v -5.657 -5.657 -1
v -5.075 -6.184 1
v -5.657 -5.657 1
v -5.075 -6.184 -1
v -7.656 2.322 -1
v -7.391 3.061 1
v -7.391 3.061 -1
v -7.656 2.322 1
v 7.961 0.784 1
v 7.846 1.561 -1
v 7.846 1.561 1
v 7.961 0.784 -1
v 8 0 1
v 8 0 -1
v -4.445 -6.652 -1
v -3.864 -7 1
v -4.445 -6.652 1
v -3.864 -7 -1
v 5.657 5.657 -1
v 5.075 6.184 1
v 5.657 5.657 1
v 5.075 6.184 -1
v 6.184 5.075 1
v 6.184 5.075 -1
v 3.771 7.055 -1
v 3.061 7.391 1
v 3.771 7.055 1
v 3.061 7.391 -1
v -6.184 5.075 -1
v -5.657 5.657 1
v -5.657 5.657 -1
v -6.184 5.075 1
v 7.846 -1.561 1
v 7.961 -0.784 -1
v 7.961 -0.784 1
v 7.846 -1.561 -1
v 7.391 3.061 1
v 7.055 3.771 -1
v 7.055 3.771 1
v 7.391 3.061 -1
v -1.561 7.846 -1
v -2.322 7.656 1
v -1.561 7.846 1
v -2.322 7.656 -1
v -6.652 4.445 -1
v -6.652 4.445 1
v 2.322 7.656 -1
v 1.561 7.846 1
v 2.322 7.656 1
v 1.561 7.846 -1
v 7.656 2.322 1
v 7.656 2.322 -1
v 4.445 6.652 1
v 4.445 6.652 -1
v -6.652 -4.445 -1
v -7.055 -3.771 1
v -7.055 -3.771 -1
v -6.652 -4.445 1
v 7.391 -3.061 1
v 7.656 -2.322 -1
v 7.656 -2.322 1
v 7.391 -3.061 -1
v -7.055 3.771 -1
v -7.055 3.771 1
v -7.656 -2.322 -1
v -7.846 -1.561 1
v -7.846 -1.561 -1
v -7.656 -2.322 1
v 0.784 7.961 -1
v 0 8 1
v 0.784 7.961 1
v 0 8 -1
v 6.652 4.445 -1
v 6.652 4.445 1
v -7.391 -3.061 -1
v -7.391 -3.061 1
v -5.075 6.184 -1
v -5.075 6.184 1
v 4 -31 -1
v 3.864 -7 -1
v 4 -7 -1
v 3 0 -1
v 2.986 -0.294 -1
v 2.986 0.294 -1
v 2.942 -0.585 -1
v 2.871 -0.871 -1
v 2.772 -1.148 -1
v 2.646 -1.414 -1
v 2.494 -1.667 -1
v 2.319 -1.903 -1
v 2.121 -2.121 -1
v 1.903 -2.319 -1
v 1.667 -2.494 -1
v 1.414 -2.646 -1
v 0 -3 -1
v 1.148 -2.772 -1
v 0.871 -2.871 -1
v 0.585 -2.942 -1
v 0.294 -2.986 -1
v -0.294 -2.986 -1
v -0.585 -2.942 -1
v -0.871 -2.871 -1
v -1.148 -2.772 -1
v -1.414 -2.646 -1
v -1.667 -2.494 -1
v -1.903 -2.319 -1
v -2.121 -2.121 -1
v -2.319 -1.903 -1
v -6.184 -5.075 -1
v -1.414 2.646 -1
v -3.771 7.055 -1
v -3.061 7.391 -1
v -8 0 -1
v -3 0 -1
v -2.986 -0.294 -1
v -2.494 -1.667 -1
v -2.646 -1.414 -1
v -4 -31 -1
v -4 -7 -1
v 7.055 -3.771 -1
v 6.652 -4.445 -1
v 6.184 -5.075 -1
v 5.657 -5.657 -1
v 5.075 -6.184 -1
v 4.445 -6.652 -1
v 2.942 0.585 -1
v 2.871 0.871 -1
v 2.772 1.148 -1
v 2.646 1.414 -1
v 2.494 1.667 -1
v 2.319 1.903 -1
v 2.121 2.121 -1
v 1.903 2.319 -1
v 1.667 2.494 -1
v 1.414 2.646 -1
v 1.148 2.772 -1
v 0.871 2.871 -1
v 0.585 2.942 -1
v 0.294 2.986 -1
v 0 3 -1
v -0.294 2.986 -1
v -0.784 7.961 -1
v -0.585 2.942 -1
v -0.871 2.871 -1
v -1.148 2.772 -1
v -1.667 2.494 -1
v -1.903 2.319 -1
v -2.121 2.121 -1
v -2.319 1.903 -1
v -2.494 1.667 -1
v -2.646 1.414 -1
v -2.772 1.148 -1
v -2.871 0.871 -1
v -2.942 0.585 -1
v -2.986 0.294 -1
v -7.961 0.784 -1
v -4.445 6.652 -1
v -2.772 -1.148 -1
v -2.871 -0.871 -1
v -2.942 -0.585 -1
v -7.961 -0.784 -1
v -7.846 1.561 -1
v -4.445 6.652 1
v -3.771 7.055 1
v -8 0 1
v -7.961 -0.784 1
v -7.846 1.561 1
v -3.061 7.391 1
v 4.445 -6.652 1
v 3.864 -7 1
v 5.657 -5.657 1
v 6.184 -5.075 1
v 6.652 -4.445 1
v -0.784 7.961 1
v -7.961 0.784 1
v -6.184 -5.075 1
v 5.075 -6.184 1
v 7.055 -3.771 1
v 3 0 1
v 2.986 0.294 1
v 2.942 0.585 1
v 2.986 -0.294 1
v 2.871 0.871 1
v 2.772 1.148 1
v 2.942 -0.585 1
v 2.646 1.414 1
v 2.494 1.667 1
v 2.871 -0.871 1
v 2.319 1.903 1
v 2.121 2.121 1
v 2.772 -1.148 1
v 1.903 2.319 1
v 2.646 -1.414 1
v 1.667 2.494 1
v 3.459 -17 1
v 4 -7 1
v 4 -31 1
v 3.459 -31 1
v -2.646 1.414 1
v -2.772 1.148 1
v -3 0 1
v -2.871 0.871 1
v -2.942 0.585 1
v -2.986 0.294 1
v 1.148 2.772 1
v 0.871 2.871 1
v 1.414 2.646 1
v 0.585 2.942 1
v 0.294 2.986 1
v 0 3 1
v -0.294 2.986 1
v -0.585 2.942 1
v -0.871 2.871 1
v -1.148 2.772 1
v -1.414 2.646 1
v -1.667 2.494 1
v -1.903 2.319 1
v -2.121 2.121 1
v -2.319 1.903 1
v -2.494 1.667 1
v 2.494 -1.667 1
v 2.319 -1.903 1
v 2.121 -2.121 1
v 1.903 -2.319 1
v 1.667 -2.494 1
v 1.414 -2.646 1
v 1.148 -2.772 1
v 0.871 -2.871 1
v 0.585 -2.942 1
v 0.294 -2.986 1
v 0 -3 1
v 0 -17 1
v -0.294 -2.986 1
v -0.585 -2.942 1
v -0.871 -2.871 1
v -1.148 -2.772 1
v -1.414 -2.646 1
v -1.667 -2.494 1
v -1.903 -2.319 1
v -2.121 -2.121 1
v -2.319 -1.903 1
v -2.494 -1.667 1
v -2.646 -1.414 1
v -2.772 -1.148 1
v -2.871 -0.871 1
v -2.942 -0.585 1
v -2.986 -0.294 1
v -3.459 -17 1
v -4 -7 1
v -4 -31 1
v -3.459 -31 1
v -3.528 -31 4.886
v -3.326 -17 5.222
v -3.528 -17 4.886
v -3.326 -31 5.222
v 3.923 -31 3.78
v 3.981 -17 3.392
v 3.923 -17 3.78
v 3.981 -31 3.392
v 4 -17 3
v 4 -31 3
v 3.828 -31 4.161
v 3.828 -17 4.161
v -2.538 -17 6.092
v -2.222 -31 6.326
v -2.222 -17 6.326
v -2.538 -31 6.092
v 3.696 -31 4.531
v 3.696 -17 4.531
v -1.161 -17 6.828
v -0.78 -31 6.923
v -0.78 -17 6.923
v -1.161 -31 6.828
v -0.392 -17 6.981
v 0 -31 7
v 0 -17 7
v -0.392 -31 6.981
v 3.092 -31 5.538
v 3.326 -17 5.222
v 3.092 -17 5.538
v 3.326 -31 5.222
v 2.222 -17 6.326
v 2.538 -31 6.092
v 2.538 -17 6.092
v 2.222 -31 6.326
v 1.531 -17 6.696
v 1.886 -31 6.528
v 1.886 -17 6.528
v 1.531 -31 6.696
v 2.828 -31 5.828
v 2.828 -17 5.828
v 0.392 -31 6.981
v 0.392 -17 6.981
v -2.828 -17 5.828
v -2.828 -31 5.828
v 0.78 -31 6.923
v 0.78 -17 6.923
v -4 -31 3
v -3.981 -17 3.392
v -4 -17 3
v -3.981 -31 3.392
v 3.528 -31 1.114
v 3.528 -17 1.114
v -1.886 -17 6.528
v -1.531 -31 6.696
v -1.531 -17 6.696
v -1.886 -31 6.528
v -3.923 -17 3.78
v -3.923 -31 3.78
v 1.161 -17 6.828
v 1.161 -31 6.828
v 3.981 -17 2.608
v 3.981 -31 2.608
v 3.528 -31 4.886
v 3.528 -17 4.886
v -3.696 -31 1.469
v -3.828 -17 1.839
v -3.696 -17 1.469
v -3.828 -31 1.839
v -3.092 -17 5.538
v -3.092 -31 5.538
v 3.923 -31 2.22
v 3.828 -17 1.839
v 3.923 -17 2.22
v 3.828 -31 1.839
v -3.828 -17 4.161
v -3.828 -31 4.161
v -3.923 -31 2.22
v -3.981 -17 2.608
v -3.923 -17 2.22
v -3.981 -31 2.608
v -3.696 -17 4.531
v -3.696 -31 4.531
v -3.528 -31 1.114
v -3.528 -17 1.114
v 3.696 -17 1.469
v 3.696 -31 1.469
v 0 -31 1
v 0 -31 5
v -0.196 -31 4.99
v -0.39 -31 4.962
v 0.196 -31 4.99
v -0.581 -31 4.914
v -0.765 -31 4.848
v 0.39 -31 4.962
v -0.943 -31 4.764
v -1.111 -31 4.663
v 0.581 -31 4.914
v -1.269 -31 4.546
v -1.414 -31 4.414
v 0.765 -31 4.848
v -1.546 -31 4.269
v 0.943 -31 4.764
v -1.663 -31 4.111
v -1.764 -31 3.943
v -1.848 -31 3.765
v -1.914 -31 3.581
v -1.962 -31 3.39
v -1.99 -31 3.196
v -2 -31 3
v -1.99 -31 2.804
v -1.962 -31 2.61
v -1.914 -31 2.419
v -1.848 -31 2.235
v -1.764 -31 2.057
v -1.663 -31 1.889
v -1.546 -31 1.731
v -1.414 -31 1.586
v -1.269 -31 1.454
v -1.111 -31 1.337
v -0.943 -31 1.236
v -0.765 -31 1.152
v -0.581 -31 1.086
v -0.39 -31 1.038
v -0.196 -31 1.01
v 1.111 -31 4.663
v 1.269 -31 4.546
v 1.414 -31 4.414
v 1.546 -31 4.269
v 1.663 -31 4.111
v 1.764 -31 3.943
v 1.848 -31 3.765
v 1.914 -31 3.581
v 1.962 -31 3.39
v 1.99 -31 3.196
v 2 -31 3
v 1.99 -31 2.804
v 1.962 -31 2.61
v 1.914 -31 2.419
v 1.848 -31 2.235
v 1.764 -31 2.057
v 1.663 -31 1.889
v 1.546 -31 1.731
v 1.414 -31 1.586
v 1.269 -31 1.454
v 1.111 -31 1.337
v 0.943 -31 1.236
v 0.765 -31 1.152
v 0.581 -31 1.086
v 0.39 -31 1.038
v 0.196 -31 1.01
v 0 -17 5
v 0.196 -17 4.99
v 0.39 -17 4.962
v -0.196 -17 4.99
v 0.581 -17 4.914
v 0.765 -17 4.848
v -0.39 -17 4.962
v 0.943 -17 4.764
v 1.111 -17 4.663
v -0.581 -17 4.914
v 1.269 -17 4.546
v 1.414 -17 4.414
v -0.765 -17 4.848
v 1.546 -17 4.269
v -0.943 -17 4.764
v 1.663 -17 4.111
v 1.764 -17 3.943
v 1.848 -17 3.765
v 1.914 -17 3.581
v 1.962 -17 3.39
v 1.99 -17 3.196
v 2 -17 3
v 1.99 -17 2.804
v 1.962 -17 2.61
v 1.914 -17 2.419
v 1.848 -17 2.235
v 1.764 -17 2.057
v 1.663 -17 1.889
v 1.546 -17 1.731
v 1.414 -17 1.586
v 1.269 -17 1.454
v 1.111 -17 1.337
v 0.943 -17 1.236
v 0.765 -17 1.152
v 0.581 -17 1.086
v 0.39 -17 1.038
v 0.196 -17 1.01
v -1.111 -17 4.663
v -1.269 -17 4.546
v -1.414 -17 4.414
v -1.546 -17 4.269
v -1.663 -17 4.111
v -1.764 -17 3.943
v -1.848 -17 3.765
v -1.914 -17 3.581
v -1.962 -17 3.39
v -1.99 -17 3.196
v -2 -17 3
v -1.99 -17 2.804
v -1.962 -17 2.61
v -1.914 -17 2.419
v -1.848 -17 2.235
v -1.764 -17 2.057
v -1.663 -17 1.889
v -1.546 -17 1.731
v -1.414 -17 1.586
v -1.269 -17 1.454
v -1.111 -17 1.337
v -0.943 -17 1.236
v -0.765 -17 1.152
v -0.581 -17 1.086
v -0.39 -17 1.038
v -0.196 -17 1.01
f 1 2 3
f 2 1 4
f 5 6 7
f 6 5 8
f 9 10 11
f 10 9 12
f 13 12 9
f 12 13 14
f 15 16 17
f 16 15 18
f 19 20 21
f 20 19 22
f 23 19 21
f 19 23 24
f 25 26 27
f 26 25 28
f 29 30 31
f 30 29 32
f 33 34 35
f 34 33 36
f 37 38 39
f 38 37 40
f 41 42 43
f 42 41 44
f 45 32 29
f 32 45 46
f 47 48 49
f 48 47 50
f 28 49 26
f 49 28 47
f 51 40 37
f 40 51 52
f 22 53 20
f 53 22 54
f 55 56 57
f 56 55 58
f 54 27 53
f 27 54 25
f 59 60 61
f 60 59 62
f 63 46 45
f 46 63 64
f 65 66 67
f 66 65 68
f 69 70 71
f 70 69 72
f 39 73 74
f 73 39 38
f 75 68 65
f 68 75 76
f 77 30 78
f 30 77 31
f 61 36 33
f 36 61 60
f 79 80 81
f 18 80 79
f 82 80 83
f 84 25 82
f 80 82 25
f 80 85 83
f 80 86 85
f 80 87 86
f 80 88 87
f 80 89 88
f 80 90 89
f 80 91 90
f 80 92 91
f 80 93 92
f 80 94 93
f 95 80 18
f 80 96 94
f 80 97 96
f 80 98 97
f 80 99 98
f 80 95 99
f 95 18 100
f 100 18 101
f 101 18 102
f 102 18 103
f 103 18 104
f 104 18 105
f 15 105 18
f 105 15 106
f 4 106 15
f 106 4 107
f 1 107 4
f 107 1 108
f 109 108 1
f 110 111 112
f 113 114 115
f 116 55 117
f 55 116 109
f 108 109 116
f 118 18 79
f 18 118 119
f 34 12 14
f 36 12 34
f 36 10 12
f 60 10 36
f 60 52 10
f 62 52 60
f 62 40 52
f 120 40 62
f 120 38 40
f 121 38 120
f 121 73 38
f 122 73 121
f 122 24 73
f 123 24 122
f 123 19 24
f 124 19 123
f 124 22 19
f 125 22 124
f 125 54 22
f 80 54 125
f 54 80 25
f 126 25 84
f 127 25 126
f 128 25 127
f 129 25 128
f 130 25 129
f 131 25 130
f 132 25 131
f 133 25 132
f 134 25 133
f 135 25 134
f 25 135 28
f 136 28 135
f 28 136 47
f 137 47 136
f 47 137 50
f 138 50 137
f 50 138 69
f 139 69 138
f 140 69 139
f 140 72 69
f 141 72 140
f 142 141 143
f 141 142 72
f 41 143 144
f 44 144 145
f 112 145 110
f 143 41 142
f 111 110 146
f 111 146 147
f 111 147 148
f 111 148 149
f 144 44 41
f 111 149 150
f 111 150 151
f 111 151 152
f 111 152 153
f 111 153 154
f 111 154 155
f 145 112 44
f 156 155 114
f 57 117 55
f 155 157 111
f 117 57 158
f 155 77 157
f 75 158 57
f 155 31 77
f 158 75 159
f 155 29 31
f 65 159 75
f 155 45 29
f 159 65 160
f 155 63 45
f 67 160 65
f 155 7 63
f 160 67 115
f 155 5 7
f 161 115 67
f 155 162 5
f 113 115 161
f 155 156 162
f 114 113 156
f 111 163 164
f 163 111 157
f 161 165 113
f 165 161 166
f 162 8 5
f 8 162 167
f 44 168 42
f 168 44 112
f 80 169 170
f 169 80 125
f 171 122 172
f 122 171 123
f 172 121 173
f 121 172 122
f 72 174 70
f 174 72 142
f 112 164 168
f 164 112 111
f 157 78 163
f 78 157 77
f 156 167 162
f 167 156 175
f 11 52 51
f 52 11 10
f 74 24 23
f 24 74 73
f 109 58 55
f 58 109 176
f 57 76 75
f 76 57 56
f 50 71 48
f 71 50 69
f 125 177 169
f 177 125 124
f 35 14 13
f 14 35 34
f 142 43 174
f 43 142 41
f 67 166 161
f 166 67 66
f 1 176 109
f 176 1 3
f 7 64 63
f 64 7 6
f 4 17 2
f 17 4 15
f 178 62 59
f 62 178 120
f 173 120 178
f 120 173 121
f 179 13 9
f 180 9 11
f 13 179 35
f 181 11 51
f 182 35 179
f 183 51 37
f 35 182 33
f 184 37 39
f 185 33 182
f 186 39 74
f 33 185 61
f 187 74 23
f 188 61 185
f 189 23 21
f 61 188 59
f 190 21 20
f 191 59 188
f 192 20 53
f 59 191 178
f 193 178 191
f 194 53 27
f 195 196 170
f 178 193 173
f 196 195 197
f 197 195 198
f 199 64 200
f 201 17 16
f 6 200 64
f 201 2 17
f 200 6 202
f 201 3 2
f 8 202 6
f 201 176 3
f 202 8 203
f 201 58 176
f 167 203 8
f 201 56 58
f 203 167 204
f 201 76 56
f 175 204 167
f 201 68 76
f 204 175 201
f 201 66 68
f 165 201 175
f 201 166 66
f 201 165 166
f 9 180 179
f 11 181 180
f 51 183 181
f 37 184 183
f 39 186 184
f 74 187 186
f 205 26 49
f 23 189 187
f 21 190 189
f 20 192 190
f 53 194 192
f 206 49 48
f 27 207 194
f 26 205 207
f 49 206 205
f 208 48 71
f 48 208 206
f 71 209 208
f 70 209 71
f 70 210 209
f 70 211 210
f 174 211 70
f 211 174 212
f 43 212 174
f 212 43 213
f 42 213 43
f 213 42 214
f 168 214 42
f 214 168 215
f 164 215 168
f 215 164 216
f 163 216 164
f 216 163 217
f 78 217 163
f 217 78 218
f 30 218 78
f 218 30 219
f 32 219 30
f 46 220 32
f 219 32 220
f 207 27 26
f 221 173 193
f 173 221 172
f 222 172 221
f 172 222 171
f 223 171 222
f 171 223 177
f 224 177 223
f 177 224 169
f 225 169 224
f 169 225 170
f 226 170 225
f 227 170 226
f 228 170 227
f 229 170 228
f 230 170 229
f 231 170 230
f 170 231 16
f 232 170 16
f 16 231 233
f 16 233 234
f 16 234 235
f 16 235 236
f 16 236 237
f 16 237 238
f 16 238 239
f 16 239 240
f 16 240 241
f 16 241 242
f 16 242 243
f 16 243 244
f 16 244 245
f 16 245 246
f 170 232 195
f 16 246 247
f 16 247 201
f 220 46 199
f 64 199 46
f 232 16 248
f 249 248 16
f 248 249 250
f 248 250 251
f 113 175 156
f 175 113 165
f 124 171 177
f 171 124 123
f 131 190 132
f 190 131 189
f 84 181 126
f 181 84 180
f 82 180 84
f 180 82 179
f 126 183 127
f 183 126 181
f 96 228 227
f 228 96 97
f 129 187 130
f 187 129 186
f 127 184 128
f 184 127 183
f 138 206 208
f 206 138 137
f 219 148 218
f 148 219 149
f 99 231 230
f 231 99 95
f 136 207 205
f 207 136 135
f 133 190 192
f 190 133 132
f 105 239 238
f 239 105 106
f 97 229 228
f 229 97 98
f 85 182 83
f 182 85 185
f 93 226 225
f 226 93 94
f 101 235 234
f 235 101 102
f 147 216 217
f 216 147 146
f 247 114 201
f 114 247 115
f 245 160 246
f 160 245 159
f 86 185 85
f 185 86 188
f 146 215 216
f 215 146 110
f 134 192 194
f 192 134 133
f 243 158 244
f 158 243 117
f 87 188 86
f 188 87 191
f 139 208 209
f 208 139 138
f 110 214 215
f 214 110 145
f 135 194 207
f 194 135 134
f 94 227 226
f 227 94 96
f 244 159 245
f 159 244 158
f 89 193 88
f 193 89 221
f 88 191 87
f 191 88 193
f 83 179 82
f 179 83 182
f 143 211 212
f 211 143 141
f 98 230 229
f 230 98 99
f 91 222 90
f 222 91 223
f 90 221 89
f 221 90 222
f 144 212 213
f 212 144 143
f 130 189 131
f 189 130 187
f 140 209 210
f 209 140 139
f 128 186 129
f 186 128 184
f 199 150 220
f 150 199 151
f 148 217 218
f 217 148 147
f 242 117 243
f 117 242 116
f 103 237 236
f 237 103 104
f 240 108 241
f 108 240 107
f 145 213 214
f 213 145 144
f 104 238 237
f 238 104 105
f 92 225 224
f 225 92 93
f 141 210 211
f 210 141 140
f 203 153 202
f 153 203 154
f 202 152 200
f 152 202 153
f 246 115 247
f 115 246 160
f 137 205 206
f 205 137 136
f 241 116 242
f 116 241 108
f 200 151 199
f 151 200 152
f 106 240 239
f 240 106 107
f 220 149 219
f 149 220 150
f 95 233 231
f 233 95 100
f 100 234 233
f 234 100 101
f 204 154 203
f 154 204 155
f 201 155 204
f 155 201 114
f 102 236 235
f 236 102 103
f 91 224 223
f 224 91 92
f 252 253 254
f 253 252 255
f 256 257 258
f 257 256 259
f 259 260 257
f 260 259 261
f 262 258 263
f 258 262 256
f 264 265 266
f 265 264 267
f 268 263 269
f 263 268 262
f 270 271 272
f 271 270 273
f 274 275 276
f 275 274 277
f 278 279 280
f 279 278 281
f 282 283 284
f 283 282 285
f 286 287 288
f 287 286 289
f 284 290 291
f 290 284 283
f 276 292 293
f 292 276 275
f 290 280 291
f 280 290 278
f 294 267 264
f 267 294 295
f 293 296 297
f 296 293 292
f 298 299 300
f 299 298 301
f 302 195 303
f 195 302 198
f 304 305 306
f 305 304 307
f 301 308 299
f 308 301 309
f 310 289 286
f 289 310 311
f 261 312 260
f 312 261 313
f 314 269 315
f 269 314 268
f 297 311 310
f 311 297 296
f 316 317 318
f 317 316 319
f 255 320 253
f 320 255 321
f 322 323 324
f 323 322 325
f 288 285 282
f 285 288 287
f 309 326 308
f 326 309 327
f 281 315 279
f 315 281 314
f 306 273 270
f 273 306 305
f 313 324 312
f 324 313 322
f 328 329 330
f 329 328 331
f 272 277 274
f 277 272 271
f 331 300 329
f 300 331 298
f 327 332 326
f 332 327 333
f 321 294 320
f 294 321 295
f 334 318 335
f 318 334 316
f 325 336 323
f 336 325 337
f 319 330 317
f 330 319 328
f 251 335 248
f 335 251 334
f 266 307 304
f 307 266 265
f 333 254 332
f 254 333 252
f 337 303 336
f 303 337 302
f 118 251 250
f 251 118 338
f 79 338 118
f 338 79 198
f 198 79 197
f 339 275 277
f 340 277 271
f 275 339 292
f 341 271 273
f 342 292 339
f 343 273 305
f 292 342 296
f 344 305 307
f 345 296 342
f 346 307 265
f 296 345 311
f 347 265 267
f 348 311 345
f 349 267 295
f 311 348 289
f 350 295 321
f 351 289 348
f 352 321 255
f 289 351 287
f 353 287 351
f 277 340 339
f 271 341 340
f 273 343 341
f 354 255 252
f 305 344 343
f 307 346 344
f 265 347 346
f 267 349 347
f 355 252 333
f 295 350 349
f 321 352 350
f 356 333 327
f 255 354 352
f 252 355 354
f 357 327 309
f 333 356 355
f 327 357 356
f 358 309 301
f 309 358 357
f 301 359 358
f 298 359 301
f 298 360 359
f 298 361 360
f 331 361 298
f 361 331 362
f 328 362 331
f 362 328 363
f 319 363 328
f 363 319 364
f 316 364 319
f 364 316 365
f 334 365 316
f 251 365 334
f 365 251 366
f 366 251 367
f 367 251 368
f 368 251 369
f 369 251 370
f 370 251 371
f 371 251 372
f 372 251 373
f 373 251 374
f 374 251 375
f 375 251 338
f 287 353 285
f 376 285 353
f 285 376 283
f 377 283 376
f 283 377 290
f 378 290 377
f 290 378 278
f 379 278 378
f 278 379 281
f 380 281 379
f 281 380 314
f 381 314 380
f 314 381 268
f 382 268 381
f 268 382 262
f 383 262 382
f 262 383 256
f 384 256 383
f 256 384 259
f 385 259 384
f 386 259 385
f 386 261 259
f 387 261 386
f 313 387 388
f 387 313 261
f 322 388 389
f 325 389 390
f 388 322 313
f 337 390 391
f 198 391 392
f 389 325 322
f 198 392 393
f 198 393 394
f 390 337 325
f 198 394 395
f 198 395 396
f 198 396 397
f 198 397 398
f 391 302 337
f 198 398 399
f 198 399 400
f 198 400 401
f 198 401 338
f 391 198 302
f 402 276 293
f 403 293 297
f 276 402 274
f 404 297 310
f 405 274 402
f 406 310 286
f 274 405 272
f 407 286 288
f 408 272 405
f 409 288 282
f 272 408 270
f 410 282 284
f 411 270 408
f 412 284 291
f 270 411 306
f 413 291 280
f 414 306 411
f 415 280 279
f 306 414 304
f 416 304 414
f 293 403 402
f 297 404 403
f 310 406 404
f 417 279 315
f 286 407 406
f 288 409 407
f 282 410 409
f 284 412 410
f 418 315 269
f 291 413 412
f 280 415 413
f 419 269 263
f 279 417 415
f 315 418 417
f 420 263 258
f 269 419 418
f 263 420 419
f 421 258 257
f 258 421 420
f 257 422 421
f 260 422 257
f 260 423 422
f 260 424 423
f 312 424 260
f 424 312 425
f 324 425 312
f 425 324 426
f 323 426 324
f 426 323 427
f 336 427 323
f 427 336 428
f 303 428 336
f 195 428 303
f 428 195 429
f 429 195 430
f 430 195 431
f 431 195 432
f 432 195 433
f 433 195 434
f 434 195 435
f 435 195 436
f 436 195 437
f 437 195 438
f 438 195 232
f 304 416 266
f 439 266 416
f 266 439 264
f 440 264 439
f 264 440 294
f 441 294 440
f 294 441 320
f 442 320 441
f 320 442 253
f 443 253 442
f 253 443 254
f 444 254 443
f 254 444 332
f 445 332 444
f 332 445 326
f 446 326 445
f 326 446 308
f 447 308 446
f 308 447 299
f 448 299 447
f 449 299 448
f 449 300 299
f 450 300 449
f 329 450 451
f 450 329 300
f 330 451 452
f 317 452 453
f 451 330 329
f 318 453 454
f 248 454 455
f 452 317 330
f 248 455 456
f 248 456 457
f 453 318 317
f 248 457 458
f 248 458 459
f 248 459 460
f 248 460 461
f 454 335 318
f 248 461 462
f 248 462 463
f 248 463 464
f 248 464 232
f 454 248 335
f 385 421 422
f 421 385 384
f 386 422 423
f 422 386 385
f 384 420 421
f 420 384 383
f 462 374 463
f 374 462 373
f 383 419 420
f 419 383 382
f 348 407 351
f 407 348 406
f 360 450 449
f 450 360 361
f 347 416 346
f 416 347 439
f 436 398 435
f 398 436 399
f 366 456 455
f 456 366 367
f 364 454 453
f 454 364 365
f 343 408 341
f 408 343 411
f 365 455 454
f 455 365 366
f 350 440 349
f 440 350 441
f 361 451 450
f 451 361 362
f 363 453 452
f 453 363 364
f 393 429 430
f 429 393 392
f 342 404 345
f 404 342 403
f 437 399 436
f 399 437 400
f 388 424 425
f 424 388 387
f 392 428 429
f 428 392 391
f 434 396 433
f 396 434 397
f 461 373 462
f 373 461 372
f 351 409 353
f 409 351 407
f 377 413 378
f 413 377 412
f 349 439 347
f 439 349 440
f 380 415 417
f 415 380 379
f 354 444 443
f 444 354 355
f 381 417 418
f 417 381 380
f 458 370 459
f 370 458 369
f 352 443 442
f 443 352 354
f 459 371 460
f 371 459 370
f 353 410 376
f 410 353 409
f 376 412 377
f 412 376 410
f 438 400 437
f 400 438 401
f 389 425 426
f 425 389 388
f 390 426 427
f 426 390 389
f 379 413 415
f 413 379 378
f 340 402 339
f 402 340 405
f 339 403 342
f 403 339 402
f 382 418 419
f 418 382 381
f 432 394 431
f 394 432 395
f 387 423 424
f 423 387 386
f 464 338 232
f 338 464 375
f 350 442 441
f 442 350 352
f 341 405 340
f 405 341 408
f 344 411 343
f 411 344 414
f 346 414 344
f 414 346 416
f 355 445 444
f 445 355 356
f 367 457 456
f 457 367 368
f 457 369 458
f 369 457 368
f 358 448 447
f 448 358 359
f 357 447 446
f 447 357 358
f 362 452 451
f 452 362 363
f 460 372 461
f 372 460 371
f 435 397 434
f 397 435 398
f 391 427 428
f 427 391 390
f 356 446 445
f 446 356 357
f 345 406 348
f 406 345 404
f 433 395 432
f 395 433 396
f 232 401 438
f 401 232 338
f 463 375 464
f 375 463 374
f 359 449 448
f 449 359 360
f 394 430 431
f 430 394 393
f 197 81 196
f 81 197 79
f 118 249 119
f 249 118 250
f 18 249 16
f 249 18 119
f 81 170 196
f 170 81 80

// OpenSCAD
// Parameters
terminal_type = 1; //[1:6:1]
thickness = 2; //[1:4:0.25]
width = 8; //[4:16:0.5]
outer_diameter = 16; //[8:32:0.5]
inner_diameter = 6; //[3:12:0.5]
overall_length = 32; //[16:64:1]
crimp_length = 14; //[0:30:1]
tongue_bend_angle_deg = 45; //[0:90:1]
transition_length = 1; //[0.5:3:0.25]
wire_hole_diameter = 4; //[0:10:0.5]
overlap = 1; //[0.5:2:0.25]
eps = 0.2; //[0.05:0.5:0.05]

// Ring Terminal - complete geometry
module ring_terminal() {
  color("Silver") {
    // Ring body with bolt hole
    difference() {
      translate([0, 0, 0])
        cylinder(r=outer_diameter/2, h=thickness, center=true, $fn=64);
      translate([0, 0, 0])
        cylinder(r=inner_diameter/2, h=thickness + 2*eps, center=true, $fn=64);
    }
    
    // Tongue plate
    translate([0, -(outer_diameter/2 + (overall_length - outer_diameter/2)/2 - overlap), 0])
      cube([width, overall_length - outer_diameter/2, thickness], center=true);
    
    // Transition fillet or hull between ring and tongue
    translate([0, -(outer_diameter/2 - overlap + transition_length/2), 0])
      cube([width, transition_length, thickness], center=true);
    
    // Wire termination section (crimp barrel)
    if (crimp_length > 0) {
      difference() {
        translate([0, -(outer_diameter/2 + (overall_length - outer_diameter/2) - crimp_length/2 - overlap), width/2 - thickness/2])
          rotate([90, 0, 0])
          cylinder(r=width/2, h=crimp_length, center=true, $fn=64);
        translate([0, -(outer_diameter/2 + (overall_length - outer_diameter/2) - crimp_length/2 - overlap), width/2 - thickness/2])
          rotate([90, 0, 0])
          cylinder(r=width/2 - thickness, h=crimp_length + transition_length + 2*eps, center=true, $fn=64);
      }
    }
  }
}

// Ring Terminal Assembly - complete geometry
module ring_terminal_assembly() {
  color("Silver") {
    // Base ring terminal
    ring_terminal();
    
    // Optional wire hole in tongue if non-crimp style
    if (crimp_length == 0 && wire_hole_diameter > 0) {
      translate([0, -(outer_diameter/2 + (overall_length - outer_diameter/2) - width/2 - overlap), 0])
        cylinder(r=wire_hole_diameter/2, h=thickness + 2*eps, center=true, $fn=64);
    }
  }
}

// Assembly
module assembly() {
  ring_terminal_assembly();
}

assembly();
